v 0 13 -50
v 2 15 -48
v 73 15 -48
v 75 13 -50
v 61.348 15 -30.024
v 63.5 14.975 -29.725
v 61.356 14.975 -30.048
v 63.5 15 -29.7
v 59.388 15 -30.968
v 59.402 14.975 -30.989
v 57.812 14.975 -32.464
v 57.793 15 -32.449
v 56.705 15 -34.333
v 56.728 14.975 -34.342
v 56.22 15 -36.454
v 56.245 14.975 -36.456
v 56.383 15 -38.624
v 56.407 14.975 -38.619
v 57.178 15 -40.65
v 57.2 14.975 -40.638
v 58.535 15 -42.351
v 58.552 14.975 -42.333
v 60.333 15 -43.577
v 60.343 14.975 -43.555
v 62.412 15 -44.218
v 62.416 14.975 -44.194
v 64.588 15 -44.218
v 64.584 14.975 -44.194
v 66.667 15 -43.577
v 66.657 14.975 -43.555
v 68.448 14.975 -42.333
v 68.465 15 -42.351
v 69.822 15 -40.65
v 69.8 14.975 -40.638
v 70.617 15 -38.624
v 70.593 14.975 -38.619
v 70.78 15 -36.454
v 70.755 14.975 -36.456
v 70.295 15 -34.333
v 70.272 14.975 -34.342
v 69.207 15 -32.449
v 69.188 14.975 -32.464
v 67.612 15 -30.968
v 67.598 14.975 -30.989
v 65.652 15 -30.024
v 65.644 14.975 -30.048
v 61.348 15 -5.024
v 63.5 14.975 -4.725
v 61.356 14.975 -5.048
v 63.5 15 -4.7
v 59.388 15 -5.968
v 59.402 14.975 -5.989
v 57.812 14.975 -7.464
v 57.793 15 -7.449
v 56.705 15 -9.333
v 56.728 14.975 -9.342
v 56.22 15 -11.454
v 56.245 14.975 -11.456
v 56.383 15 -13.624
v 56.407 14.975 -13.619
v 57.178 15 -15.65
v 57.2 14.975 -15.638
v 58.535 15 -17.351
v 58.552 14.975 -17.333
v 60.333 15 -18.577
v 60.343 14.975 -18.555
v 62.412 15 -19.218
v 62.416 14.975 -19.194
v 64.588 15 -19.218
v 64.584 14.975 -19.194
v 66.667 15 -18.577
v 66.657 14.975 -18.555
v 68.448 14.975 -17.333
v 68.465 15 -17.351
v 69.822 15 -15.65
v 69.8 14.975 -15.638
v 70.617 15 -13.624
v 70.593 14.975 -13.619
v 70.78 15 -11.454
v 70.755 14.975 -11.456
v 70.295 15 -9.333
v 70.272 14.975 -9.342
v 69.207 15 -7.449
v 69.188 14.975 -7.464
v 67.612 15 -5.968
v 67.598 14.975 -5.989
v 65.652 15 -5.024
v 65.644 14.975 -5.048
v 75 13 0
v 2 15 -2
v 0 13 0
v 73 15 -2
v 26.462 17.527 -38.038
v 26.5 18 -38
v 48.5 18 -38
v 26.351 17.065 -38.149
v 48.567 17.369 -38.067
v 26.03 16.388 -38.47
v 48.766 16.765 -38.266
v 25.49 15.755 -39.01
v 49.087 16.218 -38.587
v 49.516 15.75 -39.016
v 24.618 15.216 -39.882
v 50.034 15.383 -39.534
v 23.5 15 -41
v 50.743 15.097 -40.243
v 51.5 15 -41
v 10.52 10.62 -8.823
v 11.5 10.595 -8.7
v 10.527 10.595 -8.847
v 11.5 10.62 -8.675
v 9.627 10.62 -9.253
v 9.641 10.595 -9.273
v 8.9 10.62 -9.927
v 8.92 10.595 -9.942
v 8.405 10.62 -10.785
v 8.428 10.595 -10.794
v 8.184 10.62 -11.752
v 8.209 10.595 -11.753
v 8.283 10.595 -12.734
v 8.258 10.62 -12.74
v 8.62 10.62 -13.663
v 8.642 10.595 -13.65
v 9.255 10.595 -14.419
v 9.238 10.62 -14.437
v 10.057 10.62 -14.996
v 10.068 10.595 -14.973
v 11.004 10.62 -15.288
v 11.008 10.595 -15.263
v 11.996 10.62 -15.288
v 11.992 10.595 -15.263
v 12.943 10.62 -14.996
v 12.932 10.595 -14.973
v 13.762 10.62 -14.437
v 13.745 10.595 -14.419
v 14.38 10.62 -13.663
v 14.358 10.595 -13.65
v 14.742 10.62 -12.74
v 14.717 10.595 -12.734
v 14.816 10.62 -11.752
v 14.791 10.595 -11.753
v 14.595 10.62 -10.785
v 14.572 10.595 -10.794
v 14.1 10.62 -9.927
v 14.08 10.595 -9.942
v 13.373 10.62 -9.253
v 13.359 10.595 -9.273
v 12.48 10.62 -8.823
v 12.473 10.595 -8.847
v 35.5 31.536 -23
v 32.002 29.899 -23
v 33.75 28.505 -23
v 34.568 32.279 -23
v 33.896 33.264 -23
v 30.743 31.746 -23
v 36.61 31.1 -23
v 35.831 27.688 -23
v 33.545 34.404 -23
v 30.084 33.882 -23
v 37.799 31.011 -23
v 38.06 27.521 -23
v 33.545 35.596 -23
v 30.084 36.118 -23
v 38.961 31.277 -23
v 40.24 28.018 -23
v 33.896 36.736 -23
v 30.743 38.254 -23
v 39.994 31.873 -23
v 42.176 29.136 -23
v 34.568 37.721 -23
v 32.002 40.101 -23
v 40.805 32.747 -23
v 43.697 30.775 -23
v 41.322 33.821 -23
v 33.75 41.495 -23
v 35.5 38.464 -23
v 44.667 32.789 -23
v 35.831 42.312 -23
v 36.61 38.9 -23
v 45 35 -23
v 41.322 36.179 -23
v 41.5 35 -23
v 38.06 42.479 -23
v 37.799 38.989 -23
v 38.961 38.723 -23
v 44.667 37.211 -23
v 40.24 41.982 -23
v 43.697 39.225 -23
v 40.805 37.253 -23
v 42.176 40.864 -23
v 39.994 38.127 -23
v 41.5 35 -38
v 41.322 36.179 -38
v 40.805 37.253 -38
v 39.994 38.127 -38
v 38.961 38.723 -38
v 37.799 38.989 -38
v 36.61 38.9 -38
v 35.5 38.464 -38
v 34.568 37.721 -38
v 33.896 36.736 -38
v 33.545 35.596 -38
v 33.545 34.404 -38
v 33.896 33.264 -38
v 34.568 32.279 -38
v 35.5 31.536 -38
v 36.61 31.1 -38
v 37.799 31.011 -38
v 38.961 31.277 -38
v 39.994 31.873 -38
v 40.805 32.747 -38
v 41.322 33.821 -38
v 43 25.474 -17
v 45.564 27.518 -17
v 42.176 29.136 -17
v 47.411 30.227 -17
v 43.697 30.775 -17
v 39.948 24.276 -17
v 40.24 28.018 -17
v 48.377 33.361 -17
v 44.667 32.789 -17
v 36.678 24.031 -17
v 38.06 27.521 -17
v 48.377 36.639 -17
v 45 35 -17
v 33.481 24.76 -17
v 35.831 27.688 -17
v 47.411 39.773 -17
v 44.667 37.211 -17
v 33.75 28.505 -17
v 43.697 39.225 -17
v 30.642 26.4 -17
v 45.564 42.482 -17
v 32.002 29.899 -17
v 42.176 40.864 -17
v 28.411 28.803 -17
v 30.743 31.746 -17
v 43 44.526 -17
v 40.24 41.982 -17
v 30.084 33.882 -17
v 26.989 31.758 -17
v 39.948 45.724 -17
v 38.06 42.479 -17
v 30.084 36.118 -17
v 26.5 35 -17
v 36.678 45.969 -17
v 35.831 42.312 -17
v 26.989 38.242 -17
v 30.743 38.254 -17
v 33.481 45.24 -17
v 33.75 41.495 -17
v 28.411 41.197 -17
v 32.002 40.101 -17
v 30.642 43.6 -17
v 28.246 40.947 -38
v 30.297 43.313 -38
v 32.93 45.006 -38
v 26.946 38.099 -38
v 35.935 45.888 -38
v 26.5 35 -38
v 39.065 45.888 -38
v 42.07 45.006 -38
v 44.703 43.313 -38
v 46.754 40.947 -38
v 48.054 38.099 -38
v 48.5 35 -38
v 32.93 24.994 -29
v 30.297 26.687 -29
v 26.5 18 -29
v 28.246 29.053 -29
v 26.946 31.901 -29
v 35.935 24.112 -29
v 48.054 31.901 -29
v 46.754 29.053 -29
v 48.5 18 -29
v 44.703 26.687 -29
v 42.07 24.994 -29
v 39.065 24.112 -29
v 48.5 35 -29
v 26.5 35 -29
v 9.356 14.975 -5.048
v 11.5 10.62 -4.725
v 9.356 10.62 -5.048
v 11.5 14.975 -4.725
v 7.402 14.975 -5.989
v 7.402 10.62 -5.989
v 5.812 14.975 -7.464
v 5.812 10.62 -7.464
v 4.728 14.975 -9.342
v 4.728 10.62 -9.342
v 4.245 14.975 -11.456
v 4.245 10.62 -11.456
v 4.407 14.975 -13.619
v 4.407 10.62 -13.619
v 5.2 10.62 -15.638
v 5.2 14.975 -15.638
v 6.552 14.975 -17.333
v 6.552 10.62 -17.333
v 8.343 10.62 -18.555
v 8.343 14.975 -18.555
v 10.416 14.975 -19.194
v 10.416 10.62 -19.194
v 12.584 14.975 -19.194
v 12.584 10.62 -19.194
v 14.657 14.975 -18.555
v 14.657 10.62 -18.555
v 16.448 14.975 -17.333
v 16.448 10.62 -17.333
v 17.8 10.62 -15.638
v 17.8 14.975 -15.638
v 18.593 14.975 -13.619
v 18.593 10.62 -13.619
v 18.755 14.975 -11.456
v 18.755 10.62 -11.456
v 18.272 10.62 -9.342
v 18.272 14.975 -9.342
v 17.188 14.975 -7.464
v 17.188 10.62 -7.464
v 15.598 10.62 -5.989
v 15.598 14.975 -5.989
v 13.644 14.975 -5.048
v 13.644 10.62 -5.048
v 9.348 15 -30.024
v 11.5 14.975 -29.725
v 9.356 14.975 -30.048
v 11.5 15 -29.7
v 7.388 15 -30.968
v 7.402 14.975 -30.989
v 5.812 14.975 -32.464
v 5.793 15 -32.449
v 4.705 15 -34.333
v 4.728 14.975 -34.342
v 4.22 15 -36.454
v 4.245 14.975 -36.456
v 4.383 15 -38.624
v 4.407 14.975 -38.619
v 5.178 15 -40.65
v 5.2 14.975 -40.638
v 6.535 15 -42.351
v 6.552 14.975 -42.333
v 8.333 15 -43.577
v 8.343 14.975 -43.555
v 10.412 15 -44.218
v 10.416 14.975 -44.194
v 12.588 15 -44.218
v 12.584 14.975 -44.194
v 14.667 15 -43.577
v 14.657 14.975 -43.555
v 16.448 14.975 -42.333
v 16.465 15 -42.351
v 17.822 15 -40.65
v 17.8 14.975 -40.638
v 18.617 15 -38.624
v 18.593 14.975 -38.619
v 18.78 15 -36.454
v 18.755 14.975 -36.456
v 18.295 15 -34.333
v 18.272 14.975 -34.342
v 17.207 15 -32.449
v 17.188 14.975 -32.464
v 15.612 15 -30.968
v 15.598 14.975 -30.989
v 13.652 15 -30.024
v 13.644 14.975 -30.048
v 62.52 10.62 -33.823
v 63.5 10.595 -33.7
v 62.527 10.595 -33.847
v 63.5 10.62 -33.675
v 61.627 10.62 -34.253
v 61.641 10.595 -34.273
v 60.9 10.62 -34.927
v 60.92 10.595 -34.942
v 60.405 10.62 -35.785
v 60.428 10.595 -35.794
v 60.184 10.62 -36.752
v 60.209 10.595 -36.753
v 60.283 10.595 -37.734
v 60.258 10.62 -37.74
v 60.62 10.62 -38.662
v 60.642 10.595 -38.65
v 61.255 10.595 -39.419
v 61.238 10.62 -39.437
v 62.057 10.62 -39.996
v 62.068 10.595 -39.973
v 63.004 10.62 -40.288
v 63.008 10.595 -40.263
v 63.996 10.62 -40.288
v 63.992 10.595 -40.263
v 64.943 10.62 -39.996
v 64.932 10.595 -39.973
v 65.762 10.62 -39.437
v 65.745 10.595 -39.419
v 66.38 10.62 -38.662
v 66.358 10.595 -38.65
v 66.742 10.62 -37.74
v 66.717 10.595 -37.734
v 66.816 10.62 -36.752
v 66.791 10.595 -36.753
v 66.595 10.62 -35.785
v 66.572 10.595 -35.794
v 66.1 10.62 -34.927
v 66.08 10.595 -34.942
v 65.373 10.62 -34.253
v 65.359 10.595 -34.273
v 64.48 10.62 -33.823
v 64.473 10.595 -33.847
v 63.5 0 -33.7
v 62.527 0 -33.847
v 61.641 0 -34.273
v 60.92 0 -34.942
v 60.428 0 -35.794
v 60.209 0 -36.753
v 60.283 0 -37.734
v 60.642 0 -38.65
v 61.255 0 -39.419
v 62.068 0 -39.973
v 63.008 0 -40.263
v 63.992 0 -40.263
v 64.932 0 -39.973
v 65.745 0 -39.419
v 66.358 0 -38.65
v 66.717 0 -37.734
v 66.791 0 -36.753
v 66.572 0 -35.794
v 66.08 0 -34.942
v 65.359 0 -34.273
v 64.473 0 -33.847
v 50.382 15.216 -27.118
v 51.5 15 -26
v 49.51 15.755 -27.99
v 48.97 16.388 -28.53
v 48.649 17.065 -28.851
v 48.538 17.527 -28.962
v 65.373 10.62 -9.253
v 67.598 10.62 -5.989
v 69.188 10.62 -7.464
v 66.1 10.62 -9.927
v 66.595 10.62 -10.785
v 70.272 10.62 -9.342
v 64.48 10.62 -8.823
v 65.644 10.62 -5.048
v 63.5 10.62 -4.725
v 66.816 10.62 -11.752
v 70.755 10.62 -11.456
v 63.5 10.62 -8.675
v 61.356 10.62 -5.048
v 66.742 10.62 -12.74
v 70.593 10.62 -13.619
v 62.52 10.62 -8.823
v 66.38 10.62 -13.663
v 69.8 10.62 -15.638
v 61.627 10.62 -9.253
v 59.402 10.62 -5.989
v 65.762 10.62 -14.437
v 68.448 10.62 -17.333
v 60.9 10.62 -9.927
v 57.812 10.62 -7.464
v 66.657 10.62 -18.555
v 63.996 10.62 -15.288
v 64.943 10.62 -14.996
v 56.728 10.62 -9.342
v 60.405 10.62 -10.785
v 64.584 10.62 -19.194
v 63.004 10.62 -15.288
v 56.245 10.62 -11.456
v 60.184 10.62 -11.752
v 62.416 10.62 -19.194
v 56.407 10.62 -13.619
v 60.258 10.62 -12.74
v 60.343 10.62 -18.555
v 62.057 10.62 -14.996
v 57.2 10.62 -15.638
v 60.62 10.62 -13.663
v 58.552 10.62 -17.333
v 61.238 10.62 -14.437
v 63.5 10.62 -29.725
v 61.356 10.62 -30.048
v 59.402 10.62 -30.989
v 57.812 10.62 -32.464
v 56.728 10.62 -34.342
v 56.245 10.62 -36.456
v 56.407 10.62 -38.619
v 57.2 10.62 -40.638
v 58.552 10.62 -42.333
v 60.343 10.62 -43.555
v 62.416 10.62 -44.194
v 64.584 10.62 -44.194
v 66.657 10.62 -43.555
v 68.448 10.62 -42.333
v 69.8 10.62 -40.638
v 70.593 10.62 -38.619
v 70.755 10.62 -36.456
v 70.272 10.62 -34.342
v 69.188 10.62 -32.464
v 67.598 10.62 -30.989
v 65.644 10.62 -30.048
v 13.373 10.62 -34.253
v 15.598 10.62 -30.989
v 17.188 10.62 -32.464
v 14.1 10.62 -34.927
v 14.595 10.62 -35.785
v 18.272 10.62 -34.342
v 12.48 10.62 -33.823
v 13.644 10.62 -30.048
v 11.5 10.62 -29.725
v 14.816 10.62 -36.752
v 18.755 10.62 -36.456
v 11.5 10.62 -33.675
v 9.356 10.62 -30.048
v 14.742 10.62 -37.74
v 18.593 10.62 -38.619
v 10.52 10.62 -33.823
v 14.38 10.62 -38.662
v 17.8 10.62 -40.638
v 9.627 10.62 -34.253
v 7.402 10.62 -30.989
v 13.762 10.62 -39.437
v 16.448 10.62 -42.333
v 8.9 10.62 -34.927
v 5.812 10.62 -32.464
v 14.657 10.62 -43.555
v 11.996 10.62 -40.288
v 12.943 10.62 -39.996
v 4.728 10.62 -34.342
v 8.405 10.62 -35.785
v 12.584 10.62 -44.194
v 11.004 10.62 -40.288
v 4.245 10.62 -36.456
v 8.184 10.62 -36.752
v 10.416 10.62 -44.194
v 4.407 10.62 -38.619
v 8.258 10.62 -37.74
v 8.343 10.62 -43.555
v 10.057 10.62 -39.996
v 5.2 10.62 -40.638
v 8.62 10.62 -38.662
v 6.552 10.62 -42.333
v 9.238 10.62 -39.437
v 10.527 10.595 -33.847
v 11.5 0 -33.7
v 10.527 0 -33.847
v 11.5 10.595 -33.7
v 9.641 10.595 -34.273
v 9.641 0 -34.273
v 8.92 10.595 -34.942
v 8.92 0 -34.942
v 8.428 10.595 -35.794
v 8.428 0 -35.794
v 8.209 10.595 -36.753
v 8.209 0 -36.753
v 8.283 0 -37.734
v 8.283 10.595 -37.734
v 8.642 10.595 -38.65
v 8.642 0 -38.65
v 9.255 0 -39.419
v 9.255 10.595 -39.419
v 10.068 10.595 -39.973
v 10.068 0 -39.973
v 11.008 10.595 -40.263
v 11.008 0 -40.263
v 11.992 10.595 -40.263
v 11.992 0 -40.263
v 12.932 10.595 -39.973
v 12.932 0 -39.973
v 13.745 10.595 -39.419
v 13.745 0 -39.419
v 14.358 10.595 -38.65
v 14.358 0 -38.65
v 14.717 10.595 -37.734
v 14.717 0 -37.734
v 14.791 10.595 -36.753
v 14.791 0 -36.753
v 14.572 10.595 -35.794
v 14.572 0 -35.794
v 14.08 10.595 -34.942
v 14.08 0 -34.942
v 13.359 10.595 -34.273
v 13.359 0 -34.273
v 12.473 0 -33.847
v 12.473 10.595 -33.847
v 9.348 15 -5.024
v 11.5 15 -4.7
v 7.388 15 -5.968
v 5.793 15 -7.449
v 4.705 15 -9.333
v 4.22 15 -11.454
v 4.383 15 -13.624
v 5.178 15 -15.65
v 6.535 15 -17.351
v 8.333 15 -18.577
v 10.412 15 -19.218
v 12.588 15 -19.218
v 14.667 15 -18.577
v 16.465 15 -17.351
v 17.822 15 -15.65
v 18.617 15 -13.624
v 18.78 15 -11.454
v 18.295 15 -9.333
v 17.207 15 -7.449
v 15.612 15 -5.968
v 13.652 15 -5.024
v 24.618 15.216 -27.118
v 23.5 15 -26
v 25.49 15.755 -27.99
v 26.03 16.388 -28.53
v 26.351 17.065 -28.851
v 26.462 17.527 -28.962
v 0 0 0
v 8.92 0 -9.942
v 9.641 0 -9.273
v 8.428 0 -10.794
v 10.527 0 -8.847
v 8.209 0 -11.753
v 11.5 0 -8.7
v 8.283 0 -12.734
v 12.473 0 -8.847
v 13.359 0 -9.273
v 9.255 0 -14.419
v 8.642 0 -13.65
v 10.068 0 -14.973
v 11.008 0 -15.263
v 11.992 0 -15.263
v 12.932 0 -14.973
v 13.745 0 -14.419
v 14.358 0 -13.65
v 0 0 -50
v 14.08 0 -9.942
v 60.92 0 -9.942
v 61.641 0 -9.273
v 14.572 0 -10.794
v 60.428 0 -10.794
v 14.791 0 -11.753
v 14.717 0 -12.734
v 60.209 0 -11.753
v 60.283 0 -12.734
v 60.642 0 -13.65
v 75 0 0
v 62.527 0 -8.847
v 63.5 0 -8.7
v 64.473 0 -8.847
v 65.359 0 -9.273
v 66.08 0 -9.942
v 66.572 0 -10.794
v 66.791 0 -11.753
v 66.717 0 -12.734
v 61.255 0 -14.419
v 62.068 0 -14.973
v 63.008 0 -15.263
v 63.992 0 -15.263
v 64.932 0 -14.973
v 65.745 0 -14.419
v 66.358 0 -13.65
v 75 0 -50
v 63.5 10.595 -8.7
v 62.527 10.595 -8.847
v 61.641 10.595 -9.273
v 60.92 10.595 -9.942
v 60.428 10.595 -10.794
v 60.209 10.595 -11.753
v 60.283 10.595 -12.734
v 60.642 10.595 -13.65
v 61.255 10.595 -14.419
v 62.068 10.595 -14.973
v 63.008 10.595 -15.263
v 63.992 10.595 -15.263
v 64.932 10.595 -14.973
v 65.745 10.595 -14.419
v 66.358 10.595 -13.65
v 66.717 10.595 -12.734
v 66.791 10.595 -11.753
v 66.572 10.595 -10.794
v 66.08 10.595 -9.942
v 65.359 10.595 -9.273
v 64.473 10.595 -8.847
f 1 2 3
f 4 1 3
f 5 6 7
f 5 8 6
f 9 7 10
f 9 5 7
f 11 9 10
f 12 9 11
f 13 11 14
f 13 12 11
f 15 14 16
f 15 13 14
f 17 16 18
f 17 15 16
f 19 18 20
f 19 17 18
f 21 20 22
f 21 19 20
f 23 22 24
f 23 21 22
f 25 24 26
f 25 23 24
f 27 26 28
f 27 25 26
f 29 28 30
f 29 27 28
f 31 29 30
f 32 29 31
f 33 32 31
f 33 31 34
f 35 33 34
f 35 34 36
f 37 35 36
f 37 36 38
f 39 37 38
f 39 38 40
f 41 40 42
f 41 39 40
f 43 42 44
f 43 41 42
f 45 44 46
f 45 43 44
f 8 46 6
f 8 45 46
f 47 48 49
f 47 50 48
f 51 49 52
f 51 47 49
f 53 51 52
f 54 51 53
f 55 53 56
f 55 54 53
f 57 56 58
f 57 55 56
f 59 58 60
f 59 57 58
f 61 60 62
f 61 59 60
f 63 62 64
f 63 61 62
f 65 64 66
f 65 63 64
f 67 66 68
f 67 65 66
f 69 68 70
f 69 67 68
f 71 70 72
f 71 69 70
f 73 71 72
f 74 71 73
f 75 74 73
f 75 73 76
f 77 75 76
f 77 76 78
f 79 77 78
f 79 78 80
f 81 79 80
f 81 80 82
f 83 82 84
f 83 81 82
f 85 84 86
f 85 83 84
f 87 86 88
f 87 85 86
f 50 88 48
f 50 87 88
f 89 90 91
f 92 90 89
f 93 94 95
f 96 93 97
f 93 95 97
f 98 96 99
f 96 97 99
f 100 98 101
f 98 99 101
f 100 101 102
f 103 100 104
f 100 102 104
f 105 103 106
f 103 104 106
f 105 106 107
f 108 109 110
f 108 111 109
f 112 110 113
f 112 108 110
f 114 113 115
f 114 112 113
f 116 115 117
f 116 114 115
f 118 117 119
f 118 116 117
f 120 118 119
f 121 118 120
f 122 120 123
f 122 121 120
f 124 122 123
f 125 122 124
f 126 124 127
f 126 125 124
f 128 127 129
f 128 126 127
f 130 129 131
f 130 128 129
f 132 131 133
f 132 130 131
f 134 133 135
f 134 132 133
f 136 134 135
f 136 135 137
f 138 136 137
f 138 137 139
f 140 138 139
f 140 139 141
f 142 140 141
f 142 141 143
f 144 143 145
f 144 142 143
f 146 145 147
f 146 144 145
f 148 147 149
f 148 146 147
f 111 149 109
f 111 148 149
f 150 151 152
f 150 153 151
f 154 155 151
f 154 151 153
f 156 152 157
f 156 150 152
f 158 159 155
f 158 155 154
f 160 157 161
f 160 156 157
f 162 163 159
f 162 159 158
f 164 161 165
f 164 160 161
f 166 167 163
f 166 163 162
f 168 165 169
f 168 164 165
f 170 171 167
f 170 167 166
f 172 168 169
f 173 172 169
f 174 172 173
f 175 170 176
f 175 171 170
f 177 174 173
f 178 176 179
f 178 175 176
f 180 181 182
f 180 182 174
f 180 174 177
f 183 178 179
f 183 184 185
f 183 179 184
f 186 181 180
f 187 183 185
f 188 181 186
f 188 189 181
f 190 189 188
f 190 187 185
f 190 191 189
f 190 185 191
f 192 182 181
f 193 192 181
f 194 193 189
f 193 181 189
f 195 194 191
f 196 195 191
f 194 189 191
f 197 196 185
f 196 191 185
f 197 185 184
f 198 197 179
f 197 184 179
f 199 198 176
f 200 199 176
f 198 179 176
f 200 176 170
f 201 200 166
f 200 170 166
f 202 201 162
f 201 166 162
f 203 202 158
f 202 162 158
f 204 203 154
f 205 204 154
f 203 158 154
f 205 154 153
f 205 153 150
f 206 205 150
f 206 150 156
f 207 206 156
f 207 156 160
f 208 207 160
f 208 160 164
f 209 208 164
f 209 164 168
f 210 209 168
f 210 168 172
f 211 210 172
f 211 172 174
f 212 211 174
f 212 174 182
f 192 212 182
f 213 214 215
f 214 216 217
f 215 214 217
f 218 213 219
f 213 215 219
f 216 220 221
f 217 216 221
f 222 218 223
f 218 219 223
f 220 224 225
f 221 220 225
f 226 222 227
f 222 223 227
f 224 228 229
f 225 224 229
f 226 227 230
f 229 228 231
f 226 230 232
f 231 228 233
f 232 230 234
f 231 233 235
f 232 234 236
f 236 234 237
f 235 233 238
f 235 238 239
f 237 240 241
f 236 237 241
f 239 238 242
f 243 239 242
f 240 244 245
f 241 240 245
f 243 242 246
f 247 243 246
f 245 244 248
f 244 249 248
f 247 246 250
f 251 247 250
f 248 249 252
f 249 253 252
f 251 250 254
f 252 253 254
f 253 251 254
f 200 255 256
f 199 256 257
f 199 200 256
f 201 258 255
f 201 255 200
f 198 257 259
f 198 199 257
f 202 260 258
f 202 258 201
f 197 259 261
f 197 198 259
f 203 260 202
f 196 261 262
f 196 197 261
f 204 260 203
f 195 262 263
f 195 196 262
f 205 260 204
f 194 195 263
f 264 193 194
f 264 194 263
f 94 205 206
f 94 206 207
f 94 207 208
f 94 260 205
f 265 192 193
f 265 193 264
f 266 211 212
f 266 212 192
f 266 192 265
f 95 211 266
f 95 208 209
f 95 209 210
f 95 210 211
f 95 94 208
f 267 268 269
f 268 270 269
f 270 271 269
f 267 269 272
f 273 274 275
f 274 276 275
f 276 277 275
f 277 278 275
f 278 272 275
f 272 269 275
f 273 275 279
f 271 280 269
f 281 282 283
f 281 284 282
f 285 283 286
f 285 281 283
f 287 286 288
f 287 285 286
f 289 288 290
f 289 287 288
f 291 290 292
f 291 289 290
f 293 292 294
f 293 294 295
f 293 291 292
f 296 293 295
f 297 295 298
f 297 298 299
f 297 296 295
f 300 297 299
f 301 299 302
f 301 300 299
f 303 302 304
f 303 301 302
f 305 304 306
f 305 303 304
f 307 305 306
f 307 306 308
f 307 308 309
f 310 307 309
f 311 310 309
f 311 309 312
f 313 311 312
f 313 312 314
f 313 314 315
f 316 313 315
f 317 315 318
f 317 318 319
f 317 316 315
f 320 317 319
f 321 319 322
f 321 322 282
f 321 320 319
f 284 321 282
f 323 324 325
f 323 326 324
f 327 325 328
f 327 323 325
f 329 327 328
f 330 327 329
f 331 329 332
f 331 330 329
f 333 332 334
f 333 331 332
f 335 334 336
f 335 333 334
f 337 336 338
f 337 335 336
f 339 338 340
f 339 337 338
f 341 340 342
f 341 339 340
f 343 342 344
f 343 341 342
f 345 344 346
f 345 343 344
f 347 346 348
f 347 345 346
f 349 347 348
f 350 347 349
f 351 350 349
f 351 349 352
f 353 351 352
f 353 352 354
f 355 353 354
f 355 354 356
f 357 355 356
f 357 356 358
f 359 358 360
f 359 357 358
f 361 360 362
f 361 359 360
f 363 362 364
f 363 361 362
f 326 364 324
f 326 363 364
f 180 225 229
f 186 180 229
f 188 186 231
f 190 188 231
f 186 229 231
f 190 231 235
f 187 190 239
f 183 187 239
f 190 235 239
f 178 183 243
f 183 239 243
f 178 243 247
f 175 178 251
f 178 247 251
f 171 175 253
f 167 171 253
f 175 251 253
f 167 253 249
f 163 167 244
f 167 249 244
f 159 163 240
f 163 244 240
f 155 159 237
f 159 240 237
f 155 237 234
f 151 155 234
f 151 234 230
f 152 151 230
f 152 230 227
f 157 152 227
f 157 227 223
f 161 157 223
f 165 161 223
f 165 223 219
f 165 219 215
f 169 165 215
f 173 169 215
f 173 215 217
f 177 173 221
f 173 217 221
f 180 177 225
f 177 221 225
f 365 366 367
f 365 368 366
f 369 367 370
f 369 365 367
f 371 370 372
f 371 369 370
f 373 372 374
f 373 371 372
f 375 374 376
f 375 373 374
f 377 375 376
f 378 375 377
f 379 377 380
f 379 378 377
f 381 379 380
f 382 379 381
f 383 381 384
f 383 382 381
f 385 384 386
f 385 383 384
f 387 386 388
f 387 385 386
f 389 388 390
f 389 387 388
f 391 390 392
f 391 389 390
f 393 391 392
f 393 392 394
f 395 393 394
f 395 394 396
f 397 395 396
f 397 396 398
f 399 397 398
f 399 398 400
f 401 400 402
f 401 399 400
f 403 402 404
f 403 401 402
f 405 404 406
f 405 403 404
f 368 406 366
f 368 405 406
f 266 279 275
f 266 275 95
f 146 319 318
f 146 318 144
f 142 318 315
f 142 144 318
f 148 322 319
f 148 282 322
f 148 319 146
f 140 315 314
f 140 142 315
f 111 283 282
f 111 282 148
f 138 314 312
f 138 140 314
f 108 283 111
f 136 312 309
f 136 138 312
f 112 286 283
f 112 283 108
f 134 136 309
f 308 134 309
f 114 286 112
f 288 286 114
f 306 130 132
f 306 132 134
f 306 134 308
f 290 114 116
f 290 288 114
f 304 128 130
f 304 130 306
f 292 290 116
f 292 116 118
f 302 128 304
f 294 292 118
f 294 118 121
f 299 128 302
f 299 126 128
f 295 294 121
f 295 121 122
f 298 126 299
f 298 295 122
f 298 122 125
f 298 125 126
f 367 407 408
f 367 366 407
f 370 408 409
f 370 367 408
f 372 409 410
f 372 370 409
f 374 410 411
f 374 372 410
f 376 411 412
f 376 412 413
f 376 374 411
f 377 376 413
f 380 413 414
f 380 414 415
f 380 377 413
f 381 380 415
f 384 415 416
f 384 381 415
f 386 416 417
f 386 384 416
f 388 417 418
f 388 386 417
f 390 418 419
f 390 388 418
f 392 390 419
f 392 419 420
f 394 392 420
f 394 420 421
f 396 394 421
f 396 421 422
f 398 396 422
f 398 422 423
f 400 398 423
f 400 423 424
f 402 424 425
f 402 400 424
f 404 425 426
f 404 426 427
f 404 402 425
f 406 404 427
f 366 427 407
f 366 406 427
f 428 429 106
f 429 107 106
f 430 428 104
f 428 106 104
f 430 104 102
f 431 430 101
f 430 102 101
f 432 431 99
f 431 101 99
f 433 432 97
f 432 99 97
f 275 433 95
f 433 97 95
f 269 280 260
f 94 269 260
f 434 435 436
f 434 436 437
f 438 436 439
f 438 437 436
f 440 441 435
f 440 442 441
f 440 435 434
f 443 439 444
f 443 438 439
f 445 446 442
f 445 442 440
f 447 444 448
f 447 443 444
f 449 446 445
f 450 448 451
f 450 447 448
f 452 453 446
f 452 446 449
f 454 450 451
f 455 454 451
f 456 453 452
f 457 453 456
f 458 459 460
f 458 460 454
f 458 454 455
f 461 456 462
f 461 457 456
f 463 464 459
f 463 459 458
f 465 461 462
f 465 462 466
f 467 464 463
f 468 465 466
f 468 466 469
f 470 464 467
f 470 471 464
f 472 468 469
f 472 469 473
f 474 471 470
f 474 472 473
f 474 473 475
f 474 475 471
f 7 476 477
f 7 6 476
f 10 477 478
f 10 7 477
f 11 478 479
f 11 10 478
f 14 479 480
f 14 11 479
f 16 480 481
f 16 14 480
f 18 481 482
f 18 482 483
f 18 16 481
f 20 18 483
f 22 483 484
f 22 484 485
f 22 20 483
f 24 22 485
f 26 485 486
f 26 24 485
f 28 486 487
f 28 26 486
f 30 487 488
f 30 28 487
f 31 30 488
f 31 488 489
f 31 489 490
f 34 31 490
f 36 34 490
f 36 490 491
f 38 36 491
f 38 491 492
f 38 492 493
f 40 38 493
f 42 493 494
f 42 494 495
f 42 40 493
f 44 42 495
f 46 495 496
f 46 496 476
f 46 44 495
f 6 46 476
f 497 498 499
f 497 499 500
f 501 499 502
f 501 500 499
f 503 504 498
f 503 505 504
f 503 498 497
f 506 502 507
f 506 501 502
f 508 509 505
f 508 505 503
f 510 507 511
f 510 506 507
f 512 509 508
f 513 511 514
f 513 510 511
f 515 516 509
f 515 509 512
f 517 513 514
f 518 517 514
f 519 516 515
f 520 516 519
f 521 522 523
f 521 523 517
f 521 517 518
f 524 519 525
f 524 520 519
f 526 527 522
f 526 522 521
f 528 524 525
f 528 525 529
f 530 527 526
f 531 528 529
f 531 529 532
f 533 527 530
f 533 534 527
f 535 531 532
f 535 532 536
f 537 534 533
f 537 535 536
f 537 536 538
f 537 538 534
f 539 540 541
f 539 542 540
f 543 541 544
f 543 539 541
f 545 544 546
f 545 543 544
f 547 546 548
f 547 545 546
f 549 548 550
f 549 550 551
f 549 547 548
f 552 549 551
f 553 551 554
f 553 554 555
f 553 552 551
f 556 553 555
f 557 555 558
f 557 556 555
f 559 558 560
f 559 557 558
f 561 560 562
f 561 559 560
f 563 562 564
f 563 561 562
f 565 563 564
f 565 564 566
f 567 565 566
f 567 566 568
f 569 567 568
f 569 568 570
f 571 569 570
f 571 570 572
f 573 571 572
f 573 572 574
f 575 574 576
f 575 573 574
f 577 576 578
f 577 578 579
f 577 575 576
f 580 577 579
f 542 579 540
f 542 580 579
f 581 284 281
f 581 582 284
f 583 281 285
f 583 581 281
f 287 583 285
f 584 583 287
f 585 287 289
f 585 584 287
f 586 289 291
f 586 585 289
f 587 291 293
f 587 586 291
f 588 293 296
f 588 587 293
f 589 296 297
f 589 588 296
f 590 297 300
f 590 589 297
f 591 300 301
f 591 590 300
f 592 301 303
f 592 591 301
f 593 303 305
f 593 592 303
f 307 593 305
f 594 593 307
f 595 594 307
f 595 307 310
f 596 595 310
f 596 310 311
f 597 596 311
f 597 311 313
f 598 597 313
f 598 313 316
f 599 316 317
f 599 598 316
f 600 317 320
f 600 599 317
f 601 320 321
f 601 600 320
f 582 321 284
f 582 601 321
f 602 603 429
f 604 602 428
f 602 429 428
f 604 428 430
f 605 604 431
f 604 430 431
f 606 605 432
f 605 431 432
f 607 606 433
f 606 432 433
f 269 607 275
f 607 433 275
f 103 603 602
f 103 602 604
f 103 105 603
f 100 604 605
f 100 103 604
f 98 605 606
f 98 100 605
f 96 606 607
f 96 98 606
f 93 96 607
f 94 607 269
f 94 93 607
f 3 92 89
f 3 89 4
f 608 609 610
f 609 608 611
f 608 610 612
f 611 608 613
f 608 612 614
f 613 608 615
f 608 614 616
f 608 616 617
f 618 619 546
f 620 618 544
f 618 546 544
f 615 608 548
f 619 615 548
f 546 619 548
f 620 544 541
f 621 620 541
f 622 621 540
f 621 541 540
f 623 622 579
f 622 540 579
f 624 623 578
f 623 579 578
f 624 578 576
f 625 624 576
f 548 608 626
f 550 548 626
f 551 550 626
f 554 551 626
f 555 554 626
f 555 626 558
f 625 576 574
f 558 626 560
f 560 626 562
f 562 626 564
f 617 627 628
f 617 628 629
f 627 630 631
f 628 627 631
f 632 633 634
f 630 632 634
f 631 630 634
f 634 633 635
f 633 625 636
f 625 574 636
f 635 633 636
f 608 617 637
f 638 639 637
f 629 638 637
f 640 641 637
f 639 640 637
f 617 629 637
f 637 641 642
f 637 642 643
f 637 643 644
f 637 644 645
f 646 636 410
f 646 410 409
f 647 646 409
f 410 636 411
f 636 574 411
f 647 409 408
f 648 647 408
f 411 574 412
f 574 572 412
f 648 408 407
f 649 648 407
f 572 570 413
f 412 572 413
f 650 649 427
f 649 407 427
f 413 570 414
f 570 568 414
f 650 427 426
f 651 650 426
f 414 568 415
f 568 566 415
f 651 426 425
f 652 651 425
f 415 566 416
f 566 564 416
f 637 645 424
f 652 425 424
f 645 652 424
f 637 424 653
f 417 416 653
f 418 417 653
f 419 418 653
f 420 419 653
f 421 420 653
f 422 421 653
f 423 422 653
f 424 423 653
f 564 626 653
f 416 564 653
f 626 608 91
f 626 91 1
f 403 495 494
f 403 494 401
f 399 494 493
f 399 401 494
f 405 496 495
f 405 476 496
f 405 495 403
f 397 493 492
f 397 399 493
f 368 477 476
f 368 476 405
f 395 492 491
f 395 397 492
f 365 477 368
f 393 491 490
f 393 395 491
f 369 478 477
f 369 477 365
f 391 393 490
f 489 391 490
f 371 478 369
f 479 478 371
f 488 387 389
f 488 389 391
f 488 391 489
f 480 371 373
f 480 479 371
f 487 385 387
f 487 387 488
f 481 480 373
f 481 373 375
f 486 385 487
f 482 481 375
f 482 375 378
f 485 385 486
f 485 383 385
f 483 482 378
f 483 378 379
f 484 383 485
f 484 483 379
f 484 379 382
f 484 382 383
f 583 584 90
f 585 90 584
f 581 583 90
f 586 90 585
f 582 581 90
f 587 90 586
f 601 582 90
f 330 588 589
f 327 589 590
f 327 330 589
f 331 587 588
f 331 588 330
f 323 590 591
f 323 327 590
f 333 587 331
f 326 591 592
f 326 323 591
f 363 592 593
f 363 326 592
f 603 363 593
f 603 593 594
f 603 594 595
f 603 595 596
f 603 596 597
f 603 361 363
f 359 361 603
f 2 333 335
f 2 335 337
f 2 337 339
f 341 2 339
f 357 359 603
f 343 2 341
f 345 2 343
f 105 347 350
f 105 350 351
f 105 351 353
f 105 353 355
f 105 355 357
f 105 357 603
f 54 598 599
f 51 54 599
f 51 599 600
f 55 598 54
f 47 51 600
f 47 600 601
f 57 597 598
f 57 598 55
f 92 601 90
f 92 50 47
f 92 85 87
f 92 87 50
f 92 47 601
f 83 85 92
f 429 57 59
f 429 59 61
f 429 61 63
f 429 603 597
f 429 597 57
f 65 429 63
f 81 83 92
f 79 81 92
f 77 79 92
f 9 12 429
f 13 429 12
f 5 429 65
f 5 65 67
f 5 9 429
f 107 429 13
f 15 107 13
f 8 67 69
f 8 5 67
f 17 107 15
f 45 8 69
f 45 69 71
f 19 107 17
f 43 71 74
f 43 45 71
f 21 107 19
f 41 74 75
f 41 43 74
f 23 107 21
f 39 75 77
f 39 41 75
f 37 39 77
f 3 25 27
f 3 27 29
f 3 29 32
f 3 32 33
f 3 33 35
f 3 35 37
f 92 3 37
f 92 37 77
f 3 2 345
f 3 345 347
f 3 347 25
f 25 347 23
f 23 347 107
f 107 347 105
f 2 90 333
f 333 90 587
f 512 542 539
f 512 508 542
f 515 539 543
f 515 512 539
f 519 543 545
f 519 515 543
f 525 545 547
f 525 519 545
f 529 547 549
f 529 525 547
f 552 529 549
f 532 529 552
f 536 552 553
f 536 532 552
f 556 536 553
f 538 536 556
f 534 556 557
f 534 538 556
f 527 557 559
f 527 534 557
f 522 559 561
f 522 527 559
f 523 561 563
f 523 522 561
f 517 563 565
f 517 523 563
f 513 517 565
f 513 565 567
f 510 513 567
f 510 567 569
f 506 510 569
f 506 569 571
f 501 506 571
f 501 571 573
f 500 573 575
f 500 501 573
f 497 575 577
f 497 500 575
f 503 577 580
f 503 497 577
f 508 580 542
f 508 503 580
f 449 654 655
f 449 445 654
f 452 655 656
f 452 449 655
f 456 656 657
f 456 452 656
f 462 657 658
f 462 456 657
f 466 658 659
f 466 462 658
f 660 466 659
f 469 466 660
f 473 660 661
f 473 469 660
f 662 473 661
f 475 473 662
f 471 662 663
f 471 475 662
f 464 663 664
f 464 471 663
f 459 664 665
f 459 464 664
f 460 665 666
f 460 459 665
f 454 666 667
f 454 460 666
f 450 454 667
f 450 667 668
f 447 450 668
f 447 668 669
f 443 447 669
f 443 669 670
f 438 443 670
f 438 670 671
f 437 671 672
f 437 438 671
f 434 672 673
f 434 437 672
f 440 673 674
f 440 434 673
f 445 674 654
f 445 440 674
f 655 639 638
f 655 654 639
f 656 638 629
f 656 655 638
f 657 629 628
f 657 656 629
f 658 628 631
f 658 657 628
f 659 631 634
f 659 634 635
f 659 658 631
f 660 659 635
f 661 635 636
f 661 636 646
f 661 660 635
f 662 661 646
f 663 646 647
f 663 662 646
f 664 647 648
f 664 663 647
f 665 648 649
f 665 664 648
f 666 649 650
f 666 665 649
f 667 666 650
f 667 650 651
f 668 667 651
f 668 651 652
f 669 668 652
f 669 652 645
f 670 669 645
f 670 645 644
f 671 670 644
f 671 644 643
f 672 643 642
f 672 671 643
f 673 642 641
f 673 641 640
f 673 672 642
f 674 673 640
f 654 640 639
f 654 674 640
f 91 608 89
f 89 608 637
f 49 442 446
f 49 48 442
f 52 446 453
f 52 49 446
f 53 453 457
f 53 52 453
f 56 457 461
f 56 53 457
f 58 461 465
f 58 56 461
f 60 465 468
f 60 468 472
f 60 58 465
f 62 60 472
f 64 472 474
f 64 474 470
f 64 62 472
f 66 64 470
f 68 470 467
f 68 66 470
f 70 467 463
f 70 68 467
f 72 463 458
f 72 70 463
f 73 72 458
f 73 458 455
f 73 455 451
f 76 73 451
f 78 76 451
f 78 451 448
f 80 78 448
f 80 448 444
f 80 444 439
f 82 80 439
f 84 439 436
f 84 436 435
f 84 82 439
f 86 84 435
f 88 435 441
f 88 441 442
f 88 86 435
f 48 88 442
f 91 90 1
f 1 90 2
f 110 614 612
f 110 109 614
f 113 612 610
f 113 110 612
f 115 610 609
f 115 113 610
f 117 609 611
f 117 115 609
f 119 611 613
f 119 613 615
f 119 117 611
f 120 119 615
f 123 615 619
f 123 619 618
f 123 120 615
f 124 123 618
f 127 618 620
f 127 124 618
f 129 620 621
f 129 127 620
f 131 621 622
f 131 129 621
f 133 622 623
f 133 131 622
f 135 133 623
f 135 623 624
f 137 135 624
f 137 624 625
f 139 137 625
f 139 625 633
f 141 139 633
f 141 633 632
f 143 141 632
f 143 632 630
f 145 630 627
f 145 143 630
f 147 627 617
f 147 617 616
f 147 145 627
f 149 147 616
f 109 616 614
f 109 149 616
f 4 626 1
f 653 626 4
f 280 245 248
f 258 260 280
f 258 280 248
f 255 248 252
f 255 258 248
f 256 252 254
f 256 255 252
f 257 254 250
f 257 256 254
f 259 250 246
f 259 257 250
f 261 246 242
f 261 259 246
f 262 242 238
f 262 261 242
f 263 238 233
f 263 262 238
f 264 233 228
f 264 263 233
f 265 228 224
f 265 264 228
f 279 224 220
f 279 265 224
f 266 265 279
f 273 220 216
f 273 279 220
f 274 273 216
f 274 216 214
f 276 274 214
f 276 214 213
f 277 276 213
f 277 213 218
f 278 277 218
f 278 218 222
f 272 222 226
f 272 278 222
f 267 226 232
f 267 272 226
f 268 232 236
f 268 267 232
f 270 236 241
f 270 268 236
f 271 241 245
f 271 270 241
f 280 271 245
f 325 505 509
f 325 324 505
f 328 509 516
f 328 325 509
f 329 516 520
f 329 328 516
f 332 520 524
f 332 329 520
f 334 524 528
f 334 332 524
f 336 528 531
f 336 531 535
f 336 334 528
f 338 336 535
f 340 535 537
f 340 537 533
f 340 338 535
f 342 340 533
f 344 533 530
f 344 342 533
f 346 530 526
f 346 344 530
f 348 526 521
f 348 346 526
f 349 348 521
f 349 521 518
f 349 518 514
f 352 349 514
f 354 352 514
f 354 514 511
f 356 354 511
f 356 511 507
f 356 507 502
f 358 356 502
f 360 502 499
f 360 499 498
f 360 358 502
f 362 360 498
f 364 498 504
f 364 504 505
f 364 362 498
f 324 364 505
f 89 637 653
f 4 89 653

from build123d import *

# Parameters (mm, degrees)
SKETCH1_W            = 75
SKETCH1_H            = 50
BOSS_EXTRUDE1_DEPTH  = 15
CHAMFER1_SIZE        = 2
SKETCH2_W            = 22
SKETCH2_H            = 9
BOSS_EXTRUDE2_DEPTH  = 20
SKETCH3_R            = 11
BOSS_EXTRUDE3_DEPTH  = 21
SKETCH4_R            = 4
CUT_EXTRUDE2_DEPTH   = 94.968079687
SKETCH4_4_R          = 7.5
SKETCH4_4_R_2        = 4
CUT_EXTRUDE3_DEPTH   = 6
FILLET1_R            = 3
LPATTERN2_COUNT      = 2
LPATTERN2_PITCH      = 52
LPATTERN2_COUNT_DIR2 = 2
LPATTERN2_PITCH_DIR2 = 25


with BuildPart() as part:
    # Sketch1 → Boss-Extrude1 (new body)
    with BuildSketch(Plane(origin=(0, 0, 0), x_dir=(1, 0, 0), z_dir=(0, 1, 0))):
        with Locations((37.5, 25)):
            Rectangle(SKETCH1_W, SKETCH1_H)
    extrude(amount=BOSS_EXTRUDE1_DEPTH)

    # Chamfer1
    chamfer1_edges = [part.edges().sort_by_distance(p)[0] for p in [
        (37.5, 15, 0),
        (0, 15, -25),
        (37.5, 15, -50),
        (75, 15, -25),
    ]]
    chamfer(chamfer1_edges, length=CHAMFER1_SIZE)

    # Sketch2 → Boss-Extrude2 (add)
    with BuildSketch(Plane(origin=(0, 15, 0), x_dir=(1, 0, 0), z_dir=(0, 1, 0))):
        with Locations((37.5, 33.5)):
            Rectangle(SKETCH2_W, SKETCH2_H)
    extrude(amount=BOSS_EXTRUDE2_DEPTH)

    # Sketch3 → Boss-Extrude3 (add)
    with BuildSketch(Plane(origin=(0, 0, -38), x_dir=(-1, 0, 0), z_dir=(0, 0, -1))):
        with Locations((-37.5, 35)):
            Circle(SKETCH3_R)
    extrude(amount=-BOSS_EXTRUDE3_DEPTH)

    # Sketch4 → Cut-Extrude2 (cut, through all)
    with BuildSketch(Plane.XY.offset(-17)):
        with Locations((37.5, 35)):
            Circle(SKETCH4_R)
    extrude(amount=-CUT_EXTRUDE2_DEPTH, mode=Mode.SUBTRACT)

    # Sketch4<4> → Cut-Extrude3 (cut)
    with BuildSketch(Plane.XY.offset(-17)):
        with Locations((37.5, 35)):
            Circle(SKETCH4_4_R)
        with Locations((37.5, 35)):
            Circle(SKETCH4_4_R_2, mode=Mode.SUBTRACT)
    extrude(amount=-CUT_EXTRUDE3_DEPTH, mode=Mode.SUBTRACT)

    # Fillet1
    fillet1_edges = [part.edges().sort_by_distance(p)[0] for p in [
        (37.5, 15, -29),
        (26.5, 15, -33.5),
        (37.5, 15, -38),
        (48.5, 15, -33.5),
    ]]
    fillet(fillet1_edges, radius=FILLET1_R)

    # Sketch10 → CBORE for M6 Hex Head Bolt2 (revolve, cut)
    with BuildSketch(Plane(origin=(63.5, 15, -37), x_dir=(0, 0, 1), z_dir=(1, 0, 0))):
        Polygon((0, 0), (0, 15), (3.3, 15), (3.3, 4.405), (3.325, 4.38), (7.275, 4.38), (7.275, 0.025), (7.3, 0), align=None)
    cbore_for_m6_hex_head_bolt2 = revolve(axis=Axis((63.5, 21.35, -37), (0, -1, 0)), mode=Mode.SUBTRACT)

    # LPattern2: CBORE for M6 Hex Head Bolt2 2 × 2
    with Locations(*[(-i * LPATTERN2_PITCH, 0, j * LPATTERN2_PITCH_DIR2) for i in range(LPATTERN2_COUNT) for j in range(LPATTERN2_COUNT_DIR2) if (i, j) != (0, 0)]):
        add(cbore_for_m6_hex_head_bolt2, mode=Mode.SUBTRACT)


solid = part.part
